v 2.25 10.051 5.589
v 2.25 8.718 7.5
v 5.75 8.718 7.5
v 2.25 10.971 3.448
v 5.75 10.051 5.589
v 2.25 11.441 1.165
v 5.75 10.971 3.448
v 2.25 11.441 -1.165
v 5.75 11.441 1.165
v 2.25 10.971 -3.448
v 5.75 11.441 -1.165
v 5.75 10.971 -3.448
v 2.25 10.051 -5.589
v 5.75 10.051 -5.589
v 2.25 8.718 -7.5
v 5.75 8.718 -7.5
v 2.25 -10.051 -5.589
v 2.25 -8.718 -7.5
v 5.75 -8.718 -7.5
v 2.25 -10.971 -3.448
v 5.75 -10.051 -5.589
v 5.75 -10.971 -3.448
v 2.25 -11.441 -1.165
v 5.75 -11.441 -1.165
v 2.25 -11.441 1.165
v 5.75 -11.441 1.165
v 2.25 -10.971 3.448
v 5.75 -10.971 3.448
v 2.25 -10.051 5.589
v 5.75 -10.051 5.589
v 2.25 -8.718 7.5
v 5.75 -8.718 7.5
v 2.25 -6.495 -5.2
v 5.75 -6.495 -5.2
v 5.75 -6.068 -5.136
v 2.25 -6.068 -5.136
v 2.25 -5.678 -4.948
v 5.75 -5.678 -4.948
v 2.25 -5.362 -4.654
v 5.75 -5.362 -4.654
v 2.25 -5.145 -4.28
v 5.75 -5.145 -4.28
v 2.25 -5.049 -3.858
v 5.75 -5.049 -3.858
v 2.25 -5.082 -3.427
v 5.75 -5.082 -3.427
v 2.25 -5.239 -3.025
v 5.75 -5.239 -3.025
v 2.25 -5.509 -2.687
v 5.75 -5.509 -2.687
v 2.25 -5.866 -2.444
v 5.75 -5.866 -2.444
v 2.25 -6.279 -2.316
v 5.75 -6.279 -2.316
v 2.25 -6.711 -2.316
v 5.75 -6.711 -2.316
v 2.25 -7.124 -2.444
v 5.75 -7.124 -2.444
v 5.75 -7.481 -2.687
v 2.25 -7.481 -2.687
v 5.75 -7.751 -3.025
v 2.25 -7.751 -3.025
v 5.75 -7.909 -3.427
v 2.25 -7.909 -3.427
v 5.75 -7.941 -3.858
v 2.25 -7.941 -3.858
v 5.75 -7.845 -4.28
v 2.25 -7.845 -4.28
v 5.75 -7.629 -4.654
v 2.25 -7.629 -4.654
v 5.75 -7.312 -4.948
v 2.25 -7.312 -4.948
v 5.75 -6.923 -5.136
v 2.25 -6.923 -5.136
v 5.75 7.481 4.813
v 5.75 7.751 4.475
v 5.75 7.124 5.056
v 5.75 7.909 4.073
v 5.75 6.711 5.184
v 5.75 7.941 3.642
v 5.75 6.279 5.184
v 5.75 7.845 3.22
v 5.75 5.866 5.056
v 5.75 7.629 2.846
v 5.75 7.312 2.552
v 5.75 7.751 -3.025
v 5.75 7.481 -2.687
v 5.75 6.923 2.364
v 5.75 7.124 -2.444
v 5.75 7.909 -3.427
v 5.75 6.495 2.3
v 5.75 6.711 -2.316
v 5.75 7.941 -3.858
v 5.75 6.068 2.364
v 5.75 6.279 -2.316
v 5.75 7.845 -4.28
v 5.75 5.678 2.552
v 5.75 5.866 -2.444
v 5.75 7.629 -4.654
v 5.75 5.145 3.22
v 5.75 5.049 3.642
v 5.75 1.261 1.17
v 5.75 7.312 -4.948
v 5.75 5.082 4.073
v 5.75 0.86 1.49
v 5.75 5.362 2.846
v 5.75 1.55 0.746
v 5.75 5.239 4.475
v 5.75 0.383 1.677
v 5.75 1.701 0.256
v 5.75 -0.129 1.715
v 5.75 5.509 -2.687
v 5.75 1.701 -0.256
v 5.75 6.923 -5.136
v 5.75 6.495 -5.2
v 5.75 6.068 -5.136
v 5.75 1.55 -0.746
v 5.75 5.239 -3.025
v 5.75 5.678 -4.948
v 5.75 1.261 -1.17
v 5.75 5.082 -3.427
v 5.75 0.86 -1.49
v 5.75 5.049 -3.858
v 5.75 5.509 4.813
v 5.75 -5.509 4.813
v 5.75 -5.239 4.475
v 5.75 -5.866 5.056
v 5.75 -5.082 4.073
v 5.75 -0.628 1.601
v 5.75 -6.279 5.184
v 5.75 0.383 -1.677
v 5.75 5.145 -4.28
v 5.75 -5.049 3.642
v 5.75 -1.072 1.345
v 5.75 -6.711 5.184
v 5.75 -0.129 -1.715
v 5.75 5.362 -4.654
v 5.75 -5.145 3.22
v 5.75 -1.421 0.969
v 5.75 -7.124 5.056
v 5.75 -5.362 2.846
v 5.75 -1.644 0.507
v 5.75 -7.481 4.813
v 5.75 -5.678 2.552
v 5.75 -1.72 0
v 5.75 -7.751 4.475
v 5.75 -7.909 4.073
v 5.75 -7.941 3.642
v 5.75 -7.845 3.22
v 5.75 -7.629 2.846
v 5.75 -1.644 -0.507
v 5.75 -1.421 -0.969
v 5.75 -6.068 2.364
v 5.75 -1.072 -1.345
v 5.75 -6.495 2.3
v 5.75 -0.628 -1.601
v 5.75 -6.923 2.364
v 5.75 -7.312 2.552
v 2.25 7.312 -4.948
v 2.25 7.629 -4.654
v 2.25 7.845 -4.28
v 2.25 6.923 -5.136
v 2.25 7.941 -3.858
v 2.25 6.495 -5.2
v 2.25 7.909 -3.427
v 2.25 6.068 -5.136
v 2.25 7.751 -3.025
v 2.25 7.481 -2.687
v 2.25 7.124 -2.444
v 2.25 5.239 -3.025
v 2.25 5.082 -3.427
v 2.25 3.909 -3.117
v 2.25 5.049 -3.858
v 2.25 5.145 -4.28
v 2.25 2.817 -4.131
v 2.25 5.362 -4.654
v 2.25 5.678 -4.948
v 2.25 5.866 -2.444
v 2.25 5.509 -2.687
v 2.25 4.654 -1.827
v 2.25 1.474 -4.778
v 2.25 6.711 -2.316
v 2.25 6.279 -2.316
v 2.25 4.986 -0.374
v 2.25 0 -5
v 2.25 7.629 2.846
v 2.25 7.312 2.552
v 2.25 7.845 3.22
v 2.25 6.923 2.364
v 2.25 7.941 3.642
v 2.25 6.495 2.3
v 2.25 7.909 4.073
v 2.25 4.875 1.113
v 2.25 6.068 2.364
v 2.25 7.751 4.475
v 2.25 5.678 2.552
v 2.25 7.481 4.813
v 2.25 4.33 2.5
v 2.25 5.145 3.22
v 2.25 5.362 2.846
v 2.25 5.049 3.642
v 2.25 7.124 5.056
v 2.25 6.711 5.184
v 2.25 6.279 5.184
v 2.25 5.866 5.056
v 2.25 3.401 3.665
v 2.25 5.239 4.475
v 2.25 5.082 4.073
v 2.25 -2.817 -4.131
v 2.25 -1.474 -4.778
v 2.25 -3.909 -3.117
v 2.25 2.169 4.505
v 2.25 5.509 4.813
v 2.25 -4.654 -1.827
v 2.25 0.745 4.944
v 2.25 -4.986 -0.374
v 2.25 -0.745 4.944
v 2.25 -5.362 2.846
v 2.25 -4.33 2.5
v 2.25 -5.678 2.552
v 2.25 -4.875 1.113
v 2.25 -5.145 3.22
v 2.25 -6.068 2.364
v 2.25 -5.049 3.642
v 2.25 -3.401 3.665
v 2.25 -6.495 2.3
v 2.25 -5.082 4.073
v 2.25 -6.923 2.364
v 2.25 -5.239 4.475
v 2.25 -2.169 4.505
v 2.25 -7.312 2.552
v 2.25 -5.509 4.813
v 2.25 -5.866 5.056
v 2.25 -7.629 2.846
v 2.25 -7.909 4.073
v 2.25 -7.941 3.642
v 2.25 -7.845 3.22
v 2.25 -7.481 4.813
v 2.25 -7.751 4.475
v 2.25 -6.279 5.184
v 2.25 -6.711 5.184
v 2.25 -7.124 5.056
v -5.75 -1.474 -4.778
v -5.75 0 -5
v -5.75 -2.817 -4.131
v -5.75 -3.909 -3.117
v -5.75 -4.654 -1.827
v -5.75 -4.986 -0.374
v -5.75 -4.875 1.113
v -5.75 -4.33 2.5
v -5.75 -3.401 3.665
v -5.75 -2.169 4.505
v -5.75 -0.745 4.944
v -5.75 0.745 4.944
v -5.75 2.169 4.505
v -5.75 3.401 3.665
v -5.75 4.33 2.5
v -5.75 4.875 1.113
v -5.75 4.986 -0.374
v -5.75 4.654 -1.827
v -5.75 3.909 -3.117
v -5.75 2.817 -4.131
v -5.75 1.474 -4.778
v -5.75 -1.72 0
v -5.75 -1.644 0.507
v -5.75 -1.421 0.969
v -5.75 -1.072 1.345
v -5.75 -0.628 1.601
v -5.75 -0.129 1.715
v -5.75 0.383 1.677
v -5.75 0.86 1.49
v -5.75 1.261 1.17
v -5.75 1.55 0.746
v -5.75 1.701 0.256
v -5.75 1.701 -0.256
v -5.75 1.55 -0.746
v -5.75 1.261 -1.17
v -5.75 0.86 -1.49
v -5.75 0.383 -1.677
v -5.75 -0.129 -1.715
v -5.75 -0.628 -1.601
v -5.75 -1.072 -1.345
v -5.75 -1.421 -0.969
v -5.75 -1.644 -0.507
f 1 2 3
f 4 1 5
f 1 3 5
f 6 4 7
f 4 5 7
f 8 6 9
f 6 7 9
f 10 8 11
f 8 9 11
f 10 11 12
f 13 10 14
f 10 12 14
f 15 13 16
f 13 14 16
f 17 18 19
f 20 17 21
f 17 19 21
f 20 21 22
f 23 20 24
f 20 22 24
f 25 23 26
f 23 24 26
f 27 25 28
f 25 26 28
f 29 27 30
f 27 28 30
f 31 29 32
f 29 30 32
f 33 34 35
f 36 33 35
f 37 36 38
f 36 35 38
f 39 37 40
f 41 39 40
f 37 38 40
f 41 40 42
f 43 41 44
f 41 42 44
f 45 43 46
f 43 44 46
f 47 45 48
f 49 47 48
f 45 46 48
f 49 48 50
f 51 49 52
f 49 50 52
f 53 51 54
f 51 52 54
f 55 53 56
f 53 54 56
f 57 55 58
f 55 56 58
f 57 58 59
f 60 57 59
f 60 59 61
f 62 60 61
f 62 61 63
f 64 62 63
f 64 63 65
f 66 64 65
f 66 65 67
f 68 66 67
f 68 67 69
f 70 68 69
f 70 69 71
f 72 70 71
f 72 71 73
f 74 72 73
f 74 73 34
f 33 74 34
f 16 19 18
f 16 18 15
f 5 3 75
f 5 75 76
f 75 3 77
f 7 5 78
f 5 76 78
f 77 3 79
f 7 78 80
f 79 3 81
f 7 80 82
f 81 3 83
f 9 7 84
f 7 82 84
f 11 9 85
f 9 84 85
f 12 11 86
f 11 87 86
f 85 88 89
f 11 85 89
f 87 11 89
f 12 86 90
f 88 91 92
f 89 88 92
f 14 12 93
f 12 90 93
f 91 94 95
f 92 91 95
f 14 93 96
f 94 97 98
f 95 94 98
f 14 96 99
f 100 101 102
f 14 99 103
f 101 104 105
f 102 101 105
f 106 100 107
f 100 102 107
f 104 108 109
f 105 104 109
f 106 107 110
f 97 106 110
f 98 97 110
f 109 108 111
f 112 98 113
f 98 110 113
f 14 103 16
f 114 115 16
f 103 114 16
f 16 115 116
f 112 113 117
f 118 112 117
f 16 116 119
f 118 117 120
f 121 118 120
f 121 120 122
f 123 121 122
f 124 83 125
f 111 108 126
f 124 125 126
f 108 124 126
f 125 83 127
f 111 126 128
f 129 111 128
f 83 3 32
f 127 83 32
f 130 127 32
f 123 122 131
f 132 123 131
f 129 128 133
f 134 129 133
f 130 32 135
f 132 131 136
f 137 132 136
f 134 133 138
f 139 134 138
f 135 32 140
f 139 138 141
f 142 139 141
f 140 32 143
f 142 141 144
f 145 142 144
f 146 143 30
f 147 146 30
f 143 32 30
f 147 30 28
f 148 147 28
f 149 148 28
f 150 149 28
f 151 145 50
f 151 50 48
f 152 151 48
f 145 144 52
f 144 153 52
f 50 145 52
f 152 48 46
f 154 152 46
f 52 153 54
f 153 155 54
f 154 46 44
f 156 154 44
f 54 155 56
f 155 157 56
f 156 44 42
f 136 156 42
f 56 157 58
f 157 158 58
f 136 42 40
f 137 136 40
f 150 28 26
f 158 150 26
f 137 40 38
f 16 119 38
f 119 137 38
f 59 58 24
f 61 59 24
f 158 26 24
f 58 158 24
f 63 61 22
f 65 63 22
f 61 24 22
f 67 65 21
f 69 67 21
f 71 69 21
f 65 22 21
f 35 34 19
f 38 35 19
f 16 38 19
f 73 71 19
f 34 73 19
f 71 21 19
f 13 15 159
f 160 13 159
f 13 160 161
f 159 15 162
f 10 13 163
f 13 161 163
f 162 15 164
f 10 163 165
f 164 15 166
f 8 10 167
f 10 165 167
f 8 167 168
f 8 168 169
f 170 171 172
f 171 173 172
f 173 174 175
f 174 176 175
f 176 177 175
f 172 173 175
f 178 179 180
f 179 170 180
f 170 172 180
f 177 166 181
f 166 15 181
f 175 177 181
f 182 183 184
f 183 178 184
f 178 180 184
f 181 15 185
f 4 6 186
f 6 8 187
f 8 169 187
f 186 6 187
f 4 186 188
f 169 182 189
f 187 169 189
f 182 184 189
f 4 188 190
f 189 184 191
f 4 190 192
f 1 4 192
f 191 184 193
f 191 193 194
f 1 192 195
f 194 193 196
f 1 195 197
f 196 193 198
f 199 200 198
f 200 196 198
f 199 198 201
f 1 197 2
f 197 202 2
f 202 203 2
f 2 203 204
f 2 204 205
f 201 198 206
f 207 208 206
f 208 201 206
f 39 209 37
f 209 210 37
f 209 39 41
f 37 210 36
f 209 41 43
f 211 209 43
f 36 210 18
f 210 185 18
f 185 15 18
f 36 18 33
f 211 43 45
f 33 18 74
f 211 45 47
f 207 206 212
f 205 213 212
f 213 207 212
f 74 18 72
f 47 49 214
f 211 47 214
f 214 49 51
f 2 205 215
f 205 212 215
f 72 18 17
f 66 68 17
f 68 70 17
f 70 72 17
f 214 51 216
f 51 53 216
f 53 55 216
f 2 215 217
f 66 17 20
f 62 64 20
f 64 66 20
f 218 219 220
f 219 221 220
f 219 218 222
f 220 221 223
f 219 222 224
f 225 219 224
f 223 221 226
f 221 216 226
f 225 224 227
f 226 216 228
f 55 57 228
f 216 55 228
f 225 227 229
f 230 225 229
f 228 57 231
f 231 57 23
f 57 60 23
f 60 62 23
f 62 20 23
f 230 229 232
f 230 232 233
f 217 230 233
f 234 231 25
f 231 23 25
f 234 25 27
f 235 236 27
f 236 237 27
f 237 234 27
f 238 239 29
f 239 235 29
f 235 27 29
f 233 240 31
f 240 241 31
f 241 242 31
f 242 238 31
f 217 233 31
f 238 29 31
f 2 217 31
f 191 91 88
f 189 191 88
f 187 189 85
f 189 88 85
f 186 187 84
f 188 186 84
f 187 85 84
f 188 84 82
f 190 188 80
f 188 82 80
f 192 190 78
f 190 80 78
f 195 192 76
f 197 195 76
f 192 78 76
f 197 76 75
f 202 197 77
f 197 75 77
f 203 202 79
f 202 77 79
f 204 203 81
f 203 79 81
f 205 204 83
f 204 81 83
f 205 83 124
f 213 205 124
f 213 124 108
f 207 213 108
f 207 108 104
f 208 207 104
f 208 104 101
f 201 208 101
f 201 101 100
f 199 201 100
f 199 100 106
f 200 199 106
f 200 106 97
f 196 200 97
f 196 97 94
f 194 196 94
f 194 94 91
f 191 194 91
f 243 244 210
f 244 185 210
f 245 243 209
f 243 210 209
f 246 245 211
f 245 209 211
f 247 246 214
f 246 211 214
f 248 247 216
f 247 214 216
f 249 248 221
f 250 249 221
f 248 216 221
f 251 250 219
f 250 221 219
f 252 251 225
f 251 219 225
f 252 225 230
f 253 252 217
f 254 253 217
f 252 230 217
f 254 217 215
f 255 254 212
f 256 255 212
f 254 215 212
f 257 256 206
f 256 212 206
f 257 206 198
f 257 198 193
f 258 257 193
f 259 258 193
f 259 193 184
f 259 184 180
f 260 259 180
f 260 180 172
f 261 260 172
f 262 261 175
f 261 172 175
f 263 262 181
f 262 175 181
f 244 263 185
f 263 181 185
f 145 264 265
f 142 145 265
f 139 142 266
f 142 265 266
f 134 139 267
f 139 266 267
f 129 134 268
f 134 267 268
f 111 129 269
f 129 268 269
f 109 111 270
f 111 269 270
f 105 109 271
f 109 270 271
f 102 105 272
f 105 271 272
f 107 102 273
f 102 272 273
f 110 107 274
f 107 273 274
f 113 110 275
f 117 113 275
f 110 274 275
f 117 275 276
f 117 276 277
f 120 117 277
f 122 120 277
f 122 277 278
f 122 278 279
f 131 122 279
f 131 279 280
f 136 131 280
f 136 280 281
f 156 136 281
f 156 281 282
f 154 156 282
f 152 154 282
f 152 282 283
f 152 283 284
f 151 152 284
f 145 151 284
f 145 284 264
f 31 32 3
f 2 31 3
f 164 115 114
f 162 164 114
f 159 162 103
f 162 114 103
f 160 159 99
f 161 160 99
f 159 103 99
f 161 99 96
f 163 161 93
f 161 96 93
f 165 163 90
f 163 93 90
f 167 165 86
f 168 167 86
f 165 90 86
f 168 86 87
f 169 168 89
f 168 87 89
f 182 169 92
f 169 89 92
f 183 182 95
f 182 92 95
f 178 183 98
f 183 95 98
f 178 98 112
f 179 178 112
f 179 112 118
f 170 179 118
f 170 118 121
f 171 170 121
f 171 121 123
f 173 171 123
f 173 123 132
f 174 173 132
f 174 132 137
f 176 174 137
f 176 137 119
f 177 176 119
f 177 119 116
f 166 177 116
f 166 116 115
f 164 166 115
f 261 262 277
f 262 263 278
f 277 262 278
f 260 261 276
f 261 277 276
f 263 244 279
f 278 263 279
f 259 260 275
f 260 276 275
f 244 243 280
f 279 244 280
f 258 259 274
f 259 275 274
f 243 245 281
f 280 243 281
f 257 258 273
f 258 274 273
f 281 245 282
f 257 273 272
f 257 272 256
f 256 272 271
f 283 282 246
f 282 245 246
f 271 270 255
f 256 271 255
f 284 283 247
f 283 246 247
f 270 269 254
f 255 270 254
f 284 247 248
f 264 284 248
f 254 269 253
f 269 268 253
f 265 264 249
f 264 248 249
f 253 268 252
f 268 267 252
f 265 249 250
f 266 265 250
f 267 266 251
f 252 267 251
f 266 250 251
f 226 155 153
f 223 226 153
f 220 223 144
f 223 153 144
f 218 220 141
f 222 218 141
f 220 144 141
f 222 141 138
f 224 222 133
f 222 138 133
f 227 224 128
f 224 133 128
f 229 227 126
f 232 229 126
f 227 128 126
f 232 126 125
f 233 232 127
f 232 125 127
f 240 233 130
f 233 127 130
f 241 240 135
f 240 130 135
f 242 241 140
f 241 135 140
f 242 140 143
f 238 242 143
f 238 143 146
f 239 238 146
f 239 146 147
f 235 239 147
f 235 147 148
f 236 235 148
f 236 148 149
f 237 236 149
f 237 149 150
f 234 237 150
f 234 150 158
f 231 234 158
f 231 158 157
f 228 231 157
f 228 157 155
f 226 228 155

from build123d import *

# Parameters (mm, degrees)
SKETCH_3_R           = 1.72
CUT_EXTRUDE_1_DEPTH  = 20.918584287
SKETCH_5_R           = 1.45
CUT_EXTRUDE_2_DEPTH  = 20.918584287
SKETCH_6_OUTSIDE_W   = 31.9
SKETCH_6_OUTSIDE_H   = 31.9
SKETCH_6_OUTSIDE_W_2 = 15
SKETCH_6_OUTSIDE_H_2 = 23
CUT_EXTRUDE_3_DEPTH  = 20.918584287


with BuildPart() as part:
    # 草图2 → 旋转1 (revolve)
    with BuildSketch(Plane.XY, mode=Mode.PRIVATE) as revolve_1_sk:
        Polygon((-5.75, 0), (-5.75, 5), (2.25, 5), (2.25, 11.5), (5.75, 11.5), (5.75, 0), align=None)
    revolve(revolve_1_sk.sketch.rotate(Axis((5.75, 0, 0), (-1, 0, 0)), 90), axis=Axis((5.75, 0, 0), (-1, 0, 0)))

    # 草图3 → 切除-拉伸1 (cut, through all)
    with BuildSketch(Plane.ZY.offset(5.75)):
        with Locations(Location((0, 0, 0), (0, 0, 270))):
            Circle(SKETCH_3_R)
    extrude(amount=-CUT_EXTRUDE_1_DEPTH, mode=Mode.SUBTRACT)

    # 草图5 → 切除-拉伸2 (cut, through all)
    with BuildSketch(Plane(origin=(5.75, 0, 0), x_dir=(0, 0, -1), z_dir=(1, 0, 0))):
        with Locations((-3.75, 6.495190528)):
            Circle(SKETCH_5_R)
        with Locations((3.75, 6.495190528)):
            Circle(SKETCH_5_R)
        with Locations((-3.75, -6.495190528)):
            Circle(SKETCH_5_R)
        with Locations((3.75, -6.495190528)):
            Circle(SKETCH_5_R)
    extrude(amount=-CUT_EXTRUDE_2_DEPTH, mode=Mode.SUBTRACT)

    # 草图6 outside → 切除-拉伸3 (cut, through all)
    with BuildSketch(Plane(origin=(5.75, 0, 0), x_dir=(0, 0, -1), z_dir=(1, 0, 0))):
        Rectangle(SKETCH_6_OUTSIDE_W, SKETCH_6_OUTSIDE_H)
        Rectangle(SKETCH_6_OUTSIDE_W_2, SKETCH_6_OUTSIDE_H_2, mode=Mode.SUBTRACT)
    extrude(amount=-CUT_EXTRUDE_3_DEPTH, mode=Mode.SUBTRACT)


solid = part.part
